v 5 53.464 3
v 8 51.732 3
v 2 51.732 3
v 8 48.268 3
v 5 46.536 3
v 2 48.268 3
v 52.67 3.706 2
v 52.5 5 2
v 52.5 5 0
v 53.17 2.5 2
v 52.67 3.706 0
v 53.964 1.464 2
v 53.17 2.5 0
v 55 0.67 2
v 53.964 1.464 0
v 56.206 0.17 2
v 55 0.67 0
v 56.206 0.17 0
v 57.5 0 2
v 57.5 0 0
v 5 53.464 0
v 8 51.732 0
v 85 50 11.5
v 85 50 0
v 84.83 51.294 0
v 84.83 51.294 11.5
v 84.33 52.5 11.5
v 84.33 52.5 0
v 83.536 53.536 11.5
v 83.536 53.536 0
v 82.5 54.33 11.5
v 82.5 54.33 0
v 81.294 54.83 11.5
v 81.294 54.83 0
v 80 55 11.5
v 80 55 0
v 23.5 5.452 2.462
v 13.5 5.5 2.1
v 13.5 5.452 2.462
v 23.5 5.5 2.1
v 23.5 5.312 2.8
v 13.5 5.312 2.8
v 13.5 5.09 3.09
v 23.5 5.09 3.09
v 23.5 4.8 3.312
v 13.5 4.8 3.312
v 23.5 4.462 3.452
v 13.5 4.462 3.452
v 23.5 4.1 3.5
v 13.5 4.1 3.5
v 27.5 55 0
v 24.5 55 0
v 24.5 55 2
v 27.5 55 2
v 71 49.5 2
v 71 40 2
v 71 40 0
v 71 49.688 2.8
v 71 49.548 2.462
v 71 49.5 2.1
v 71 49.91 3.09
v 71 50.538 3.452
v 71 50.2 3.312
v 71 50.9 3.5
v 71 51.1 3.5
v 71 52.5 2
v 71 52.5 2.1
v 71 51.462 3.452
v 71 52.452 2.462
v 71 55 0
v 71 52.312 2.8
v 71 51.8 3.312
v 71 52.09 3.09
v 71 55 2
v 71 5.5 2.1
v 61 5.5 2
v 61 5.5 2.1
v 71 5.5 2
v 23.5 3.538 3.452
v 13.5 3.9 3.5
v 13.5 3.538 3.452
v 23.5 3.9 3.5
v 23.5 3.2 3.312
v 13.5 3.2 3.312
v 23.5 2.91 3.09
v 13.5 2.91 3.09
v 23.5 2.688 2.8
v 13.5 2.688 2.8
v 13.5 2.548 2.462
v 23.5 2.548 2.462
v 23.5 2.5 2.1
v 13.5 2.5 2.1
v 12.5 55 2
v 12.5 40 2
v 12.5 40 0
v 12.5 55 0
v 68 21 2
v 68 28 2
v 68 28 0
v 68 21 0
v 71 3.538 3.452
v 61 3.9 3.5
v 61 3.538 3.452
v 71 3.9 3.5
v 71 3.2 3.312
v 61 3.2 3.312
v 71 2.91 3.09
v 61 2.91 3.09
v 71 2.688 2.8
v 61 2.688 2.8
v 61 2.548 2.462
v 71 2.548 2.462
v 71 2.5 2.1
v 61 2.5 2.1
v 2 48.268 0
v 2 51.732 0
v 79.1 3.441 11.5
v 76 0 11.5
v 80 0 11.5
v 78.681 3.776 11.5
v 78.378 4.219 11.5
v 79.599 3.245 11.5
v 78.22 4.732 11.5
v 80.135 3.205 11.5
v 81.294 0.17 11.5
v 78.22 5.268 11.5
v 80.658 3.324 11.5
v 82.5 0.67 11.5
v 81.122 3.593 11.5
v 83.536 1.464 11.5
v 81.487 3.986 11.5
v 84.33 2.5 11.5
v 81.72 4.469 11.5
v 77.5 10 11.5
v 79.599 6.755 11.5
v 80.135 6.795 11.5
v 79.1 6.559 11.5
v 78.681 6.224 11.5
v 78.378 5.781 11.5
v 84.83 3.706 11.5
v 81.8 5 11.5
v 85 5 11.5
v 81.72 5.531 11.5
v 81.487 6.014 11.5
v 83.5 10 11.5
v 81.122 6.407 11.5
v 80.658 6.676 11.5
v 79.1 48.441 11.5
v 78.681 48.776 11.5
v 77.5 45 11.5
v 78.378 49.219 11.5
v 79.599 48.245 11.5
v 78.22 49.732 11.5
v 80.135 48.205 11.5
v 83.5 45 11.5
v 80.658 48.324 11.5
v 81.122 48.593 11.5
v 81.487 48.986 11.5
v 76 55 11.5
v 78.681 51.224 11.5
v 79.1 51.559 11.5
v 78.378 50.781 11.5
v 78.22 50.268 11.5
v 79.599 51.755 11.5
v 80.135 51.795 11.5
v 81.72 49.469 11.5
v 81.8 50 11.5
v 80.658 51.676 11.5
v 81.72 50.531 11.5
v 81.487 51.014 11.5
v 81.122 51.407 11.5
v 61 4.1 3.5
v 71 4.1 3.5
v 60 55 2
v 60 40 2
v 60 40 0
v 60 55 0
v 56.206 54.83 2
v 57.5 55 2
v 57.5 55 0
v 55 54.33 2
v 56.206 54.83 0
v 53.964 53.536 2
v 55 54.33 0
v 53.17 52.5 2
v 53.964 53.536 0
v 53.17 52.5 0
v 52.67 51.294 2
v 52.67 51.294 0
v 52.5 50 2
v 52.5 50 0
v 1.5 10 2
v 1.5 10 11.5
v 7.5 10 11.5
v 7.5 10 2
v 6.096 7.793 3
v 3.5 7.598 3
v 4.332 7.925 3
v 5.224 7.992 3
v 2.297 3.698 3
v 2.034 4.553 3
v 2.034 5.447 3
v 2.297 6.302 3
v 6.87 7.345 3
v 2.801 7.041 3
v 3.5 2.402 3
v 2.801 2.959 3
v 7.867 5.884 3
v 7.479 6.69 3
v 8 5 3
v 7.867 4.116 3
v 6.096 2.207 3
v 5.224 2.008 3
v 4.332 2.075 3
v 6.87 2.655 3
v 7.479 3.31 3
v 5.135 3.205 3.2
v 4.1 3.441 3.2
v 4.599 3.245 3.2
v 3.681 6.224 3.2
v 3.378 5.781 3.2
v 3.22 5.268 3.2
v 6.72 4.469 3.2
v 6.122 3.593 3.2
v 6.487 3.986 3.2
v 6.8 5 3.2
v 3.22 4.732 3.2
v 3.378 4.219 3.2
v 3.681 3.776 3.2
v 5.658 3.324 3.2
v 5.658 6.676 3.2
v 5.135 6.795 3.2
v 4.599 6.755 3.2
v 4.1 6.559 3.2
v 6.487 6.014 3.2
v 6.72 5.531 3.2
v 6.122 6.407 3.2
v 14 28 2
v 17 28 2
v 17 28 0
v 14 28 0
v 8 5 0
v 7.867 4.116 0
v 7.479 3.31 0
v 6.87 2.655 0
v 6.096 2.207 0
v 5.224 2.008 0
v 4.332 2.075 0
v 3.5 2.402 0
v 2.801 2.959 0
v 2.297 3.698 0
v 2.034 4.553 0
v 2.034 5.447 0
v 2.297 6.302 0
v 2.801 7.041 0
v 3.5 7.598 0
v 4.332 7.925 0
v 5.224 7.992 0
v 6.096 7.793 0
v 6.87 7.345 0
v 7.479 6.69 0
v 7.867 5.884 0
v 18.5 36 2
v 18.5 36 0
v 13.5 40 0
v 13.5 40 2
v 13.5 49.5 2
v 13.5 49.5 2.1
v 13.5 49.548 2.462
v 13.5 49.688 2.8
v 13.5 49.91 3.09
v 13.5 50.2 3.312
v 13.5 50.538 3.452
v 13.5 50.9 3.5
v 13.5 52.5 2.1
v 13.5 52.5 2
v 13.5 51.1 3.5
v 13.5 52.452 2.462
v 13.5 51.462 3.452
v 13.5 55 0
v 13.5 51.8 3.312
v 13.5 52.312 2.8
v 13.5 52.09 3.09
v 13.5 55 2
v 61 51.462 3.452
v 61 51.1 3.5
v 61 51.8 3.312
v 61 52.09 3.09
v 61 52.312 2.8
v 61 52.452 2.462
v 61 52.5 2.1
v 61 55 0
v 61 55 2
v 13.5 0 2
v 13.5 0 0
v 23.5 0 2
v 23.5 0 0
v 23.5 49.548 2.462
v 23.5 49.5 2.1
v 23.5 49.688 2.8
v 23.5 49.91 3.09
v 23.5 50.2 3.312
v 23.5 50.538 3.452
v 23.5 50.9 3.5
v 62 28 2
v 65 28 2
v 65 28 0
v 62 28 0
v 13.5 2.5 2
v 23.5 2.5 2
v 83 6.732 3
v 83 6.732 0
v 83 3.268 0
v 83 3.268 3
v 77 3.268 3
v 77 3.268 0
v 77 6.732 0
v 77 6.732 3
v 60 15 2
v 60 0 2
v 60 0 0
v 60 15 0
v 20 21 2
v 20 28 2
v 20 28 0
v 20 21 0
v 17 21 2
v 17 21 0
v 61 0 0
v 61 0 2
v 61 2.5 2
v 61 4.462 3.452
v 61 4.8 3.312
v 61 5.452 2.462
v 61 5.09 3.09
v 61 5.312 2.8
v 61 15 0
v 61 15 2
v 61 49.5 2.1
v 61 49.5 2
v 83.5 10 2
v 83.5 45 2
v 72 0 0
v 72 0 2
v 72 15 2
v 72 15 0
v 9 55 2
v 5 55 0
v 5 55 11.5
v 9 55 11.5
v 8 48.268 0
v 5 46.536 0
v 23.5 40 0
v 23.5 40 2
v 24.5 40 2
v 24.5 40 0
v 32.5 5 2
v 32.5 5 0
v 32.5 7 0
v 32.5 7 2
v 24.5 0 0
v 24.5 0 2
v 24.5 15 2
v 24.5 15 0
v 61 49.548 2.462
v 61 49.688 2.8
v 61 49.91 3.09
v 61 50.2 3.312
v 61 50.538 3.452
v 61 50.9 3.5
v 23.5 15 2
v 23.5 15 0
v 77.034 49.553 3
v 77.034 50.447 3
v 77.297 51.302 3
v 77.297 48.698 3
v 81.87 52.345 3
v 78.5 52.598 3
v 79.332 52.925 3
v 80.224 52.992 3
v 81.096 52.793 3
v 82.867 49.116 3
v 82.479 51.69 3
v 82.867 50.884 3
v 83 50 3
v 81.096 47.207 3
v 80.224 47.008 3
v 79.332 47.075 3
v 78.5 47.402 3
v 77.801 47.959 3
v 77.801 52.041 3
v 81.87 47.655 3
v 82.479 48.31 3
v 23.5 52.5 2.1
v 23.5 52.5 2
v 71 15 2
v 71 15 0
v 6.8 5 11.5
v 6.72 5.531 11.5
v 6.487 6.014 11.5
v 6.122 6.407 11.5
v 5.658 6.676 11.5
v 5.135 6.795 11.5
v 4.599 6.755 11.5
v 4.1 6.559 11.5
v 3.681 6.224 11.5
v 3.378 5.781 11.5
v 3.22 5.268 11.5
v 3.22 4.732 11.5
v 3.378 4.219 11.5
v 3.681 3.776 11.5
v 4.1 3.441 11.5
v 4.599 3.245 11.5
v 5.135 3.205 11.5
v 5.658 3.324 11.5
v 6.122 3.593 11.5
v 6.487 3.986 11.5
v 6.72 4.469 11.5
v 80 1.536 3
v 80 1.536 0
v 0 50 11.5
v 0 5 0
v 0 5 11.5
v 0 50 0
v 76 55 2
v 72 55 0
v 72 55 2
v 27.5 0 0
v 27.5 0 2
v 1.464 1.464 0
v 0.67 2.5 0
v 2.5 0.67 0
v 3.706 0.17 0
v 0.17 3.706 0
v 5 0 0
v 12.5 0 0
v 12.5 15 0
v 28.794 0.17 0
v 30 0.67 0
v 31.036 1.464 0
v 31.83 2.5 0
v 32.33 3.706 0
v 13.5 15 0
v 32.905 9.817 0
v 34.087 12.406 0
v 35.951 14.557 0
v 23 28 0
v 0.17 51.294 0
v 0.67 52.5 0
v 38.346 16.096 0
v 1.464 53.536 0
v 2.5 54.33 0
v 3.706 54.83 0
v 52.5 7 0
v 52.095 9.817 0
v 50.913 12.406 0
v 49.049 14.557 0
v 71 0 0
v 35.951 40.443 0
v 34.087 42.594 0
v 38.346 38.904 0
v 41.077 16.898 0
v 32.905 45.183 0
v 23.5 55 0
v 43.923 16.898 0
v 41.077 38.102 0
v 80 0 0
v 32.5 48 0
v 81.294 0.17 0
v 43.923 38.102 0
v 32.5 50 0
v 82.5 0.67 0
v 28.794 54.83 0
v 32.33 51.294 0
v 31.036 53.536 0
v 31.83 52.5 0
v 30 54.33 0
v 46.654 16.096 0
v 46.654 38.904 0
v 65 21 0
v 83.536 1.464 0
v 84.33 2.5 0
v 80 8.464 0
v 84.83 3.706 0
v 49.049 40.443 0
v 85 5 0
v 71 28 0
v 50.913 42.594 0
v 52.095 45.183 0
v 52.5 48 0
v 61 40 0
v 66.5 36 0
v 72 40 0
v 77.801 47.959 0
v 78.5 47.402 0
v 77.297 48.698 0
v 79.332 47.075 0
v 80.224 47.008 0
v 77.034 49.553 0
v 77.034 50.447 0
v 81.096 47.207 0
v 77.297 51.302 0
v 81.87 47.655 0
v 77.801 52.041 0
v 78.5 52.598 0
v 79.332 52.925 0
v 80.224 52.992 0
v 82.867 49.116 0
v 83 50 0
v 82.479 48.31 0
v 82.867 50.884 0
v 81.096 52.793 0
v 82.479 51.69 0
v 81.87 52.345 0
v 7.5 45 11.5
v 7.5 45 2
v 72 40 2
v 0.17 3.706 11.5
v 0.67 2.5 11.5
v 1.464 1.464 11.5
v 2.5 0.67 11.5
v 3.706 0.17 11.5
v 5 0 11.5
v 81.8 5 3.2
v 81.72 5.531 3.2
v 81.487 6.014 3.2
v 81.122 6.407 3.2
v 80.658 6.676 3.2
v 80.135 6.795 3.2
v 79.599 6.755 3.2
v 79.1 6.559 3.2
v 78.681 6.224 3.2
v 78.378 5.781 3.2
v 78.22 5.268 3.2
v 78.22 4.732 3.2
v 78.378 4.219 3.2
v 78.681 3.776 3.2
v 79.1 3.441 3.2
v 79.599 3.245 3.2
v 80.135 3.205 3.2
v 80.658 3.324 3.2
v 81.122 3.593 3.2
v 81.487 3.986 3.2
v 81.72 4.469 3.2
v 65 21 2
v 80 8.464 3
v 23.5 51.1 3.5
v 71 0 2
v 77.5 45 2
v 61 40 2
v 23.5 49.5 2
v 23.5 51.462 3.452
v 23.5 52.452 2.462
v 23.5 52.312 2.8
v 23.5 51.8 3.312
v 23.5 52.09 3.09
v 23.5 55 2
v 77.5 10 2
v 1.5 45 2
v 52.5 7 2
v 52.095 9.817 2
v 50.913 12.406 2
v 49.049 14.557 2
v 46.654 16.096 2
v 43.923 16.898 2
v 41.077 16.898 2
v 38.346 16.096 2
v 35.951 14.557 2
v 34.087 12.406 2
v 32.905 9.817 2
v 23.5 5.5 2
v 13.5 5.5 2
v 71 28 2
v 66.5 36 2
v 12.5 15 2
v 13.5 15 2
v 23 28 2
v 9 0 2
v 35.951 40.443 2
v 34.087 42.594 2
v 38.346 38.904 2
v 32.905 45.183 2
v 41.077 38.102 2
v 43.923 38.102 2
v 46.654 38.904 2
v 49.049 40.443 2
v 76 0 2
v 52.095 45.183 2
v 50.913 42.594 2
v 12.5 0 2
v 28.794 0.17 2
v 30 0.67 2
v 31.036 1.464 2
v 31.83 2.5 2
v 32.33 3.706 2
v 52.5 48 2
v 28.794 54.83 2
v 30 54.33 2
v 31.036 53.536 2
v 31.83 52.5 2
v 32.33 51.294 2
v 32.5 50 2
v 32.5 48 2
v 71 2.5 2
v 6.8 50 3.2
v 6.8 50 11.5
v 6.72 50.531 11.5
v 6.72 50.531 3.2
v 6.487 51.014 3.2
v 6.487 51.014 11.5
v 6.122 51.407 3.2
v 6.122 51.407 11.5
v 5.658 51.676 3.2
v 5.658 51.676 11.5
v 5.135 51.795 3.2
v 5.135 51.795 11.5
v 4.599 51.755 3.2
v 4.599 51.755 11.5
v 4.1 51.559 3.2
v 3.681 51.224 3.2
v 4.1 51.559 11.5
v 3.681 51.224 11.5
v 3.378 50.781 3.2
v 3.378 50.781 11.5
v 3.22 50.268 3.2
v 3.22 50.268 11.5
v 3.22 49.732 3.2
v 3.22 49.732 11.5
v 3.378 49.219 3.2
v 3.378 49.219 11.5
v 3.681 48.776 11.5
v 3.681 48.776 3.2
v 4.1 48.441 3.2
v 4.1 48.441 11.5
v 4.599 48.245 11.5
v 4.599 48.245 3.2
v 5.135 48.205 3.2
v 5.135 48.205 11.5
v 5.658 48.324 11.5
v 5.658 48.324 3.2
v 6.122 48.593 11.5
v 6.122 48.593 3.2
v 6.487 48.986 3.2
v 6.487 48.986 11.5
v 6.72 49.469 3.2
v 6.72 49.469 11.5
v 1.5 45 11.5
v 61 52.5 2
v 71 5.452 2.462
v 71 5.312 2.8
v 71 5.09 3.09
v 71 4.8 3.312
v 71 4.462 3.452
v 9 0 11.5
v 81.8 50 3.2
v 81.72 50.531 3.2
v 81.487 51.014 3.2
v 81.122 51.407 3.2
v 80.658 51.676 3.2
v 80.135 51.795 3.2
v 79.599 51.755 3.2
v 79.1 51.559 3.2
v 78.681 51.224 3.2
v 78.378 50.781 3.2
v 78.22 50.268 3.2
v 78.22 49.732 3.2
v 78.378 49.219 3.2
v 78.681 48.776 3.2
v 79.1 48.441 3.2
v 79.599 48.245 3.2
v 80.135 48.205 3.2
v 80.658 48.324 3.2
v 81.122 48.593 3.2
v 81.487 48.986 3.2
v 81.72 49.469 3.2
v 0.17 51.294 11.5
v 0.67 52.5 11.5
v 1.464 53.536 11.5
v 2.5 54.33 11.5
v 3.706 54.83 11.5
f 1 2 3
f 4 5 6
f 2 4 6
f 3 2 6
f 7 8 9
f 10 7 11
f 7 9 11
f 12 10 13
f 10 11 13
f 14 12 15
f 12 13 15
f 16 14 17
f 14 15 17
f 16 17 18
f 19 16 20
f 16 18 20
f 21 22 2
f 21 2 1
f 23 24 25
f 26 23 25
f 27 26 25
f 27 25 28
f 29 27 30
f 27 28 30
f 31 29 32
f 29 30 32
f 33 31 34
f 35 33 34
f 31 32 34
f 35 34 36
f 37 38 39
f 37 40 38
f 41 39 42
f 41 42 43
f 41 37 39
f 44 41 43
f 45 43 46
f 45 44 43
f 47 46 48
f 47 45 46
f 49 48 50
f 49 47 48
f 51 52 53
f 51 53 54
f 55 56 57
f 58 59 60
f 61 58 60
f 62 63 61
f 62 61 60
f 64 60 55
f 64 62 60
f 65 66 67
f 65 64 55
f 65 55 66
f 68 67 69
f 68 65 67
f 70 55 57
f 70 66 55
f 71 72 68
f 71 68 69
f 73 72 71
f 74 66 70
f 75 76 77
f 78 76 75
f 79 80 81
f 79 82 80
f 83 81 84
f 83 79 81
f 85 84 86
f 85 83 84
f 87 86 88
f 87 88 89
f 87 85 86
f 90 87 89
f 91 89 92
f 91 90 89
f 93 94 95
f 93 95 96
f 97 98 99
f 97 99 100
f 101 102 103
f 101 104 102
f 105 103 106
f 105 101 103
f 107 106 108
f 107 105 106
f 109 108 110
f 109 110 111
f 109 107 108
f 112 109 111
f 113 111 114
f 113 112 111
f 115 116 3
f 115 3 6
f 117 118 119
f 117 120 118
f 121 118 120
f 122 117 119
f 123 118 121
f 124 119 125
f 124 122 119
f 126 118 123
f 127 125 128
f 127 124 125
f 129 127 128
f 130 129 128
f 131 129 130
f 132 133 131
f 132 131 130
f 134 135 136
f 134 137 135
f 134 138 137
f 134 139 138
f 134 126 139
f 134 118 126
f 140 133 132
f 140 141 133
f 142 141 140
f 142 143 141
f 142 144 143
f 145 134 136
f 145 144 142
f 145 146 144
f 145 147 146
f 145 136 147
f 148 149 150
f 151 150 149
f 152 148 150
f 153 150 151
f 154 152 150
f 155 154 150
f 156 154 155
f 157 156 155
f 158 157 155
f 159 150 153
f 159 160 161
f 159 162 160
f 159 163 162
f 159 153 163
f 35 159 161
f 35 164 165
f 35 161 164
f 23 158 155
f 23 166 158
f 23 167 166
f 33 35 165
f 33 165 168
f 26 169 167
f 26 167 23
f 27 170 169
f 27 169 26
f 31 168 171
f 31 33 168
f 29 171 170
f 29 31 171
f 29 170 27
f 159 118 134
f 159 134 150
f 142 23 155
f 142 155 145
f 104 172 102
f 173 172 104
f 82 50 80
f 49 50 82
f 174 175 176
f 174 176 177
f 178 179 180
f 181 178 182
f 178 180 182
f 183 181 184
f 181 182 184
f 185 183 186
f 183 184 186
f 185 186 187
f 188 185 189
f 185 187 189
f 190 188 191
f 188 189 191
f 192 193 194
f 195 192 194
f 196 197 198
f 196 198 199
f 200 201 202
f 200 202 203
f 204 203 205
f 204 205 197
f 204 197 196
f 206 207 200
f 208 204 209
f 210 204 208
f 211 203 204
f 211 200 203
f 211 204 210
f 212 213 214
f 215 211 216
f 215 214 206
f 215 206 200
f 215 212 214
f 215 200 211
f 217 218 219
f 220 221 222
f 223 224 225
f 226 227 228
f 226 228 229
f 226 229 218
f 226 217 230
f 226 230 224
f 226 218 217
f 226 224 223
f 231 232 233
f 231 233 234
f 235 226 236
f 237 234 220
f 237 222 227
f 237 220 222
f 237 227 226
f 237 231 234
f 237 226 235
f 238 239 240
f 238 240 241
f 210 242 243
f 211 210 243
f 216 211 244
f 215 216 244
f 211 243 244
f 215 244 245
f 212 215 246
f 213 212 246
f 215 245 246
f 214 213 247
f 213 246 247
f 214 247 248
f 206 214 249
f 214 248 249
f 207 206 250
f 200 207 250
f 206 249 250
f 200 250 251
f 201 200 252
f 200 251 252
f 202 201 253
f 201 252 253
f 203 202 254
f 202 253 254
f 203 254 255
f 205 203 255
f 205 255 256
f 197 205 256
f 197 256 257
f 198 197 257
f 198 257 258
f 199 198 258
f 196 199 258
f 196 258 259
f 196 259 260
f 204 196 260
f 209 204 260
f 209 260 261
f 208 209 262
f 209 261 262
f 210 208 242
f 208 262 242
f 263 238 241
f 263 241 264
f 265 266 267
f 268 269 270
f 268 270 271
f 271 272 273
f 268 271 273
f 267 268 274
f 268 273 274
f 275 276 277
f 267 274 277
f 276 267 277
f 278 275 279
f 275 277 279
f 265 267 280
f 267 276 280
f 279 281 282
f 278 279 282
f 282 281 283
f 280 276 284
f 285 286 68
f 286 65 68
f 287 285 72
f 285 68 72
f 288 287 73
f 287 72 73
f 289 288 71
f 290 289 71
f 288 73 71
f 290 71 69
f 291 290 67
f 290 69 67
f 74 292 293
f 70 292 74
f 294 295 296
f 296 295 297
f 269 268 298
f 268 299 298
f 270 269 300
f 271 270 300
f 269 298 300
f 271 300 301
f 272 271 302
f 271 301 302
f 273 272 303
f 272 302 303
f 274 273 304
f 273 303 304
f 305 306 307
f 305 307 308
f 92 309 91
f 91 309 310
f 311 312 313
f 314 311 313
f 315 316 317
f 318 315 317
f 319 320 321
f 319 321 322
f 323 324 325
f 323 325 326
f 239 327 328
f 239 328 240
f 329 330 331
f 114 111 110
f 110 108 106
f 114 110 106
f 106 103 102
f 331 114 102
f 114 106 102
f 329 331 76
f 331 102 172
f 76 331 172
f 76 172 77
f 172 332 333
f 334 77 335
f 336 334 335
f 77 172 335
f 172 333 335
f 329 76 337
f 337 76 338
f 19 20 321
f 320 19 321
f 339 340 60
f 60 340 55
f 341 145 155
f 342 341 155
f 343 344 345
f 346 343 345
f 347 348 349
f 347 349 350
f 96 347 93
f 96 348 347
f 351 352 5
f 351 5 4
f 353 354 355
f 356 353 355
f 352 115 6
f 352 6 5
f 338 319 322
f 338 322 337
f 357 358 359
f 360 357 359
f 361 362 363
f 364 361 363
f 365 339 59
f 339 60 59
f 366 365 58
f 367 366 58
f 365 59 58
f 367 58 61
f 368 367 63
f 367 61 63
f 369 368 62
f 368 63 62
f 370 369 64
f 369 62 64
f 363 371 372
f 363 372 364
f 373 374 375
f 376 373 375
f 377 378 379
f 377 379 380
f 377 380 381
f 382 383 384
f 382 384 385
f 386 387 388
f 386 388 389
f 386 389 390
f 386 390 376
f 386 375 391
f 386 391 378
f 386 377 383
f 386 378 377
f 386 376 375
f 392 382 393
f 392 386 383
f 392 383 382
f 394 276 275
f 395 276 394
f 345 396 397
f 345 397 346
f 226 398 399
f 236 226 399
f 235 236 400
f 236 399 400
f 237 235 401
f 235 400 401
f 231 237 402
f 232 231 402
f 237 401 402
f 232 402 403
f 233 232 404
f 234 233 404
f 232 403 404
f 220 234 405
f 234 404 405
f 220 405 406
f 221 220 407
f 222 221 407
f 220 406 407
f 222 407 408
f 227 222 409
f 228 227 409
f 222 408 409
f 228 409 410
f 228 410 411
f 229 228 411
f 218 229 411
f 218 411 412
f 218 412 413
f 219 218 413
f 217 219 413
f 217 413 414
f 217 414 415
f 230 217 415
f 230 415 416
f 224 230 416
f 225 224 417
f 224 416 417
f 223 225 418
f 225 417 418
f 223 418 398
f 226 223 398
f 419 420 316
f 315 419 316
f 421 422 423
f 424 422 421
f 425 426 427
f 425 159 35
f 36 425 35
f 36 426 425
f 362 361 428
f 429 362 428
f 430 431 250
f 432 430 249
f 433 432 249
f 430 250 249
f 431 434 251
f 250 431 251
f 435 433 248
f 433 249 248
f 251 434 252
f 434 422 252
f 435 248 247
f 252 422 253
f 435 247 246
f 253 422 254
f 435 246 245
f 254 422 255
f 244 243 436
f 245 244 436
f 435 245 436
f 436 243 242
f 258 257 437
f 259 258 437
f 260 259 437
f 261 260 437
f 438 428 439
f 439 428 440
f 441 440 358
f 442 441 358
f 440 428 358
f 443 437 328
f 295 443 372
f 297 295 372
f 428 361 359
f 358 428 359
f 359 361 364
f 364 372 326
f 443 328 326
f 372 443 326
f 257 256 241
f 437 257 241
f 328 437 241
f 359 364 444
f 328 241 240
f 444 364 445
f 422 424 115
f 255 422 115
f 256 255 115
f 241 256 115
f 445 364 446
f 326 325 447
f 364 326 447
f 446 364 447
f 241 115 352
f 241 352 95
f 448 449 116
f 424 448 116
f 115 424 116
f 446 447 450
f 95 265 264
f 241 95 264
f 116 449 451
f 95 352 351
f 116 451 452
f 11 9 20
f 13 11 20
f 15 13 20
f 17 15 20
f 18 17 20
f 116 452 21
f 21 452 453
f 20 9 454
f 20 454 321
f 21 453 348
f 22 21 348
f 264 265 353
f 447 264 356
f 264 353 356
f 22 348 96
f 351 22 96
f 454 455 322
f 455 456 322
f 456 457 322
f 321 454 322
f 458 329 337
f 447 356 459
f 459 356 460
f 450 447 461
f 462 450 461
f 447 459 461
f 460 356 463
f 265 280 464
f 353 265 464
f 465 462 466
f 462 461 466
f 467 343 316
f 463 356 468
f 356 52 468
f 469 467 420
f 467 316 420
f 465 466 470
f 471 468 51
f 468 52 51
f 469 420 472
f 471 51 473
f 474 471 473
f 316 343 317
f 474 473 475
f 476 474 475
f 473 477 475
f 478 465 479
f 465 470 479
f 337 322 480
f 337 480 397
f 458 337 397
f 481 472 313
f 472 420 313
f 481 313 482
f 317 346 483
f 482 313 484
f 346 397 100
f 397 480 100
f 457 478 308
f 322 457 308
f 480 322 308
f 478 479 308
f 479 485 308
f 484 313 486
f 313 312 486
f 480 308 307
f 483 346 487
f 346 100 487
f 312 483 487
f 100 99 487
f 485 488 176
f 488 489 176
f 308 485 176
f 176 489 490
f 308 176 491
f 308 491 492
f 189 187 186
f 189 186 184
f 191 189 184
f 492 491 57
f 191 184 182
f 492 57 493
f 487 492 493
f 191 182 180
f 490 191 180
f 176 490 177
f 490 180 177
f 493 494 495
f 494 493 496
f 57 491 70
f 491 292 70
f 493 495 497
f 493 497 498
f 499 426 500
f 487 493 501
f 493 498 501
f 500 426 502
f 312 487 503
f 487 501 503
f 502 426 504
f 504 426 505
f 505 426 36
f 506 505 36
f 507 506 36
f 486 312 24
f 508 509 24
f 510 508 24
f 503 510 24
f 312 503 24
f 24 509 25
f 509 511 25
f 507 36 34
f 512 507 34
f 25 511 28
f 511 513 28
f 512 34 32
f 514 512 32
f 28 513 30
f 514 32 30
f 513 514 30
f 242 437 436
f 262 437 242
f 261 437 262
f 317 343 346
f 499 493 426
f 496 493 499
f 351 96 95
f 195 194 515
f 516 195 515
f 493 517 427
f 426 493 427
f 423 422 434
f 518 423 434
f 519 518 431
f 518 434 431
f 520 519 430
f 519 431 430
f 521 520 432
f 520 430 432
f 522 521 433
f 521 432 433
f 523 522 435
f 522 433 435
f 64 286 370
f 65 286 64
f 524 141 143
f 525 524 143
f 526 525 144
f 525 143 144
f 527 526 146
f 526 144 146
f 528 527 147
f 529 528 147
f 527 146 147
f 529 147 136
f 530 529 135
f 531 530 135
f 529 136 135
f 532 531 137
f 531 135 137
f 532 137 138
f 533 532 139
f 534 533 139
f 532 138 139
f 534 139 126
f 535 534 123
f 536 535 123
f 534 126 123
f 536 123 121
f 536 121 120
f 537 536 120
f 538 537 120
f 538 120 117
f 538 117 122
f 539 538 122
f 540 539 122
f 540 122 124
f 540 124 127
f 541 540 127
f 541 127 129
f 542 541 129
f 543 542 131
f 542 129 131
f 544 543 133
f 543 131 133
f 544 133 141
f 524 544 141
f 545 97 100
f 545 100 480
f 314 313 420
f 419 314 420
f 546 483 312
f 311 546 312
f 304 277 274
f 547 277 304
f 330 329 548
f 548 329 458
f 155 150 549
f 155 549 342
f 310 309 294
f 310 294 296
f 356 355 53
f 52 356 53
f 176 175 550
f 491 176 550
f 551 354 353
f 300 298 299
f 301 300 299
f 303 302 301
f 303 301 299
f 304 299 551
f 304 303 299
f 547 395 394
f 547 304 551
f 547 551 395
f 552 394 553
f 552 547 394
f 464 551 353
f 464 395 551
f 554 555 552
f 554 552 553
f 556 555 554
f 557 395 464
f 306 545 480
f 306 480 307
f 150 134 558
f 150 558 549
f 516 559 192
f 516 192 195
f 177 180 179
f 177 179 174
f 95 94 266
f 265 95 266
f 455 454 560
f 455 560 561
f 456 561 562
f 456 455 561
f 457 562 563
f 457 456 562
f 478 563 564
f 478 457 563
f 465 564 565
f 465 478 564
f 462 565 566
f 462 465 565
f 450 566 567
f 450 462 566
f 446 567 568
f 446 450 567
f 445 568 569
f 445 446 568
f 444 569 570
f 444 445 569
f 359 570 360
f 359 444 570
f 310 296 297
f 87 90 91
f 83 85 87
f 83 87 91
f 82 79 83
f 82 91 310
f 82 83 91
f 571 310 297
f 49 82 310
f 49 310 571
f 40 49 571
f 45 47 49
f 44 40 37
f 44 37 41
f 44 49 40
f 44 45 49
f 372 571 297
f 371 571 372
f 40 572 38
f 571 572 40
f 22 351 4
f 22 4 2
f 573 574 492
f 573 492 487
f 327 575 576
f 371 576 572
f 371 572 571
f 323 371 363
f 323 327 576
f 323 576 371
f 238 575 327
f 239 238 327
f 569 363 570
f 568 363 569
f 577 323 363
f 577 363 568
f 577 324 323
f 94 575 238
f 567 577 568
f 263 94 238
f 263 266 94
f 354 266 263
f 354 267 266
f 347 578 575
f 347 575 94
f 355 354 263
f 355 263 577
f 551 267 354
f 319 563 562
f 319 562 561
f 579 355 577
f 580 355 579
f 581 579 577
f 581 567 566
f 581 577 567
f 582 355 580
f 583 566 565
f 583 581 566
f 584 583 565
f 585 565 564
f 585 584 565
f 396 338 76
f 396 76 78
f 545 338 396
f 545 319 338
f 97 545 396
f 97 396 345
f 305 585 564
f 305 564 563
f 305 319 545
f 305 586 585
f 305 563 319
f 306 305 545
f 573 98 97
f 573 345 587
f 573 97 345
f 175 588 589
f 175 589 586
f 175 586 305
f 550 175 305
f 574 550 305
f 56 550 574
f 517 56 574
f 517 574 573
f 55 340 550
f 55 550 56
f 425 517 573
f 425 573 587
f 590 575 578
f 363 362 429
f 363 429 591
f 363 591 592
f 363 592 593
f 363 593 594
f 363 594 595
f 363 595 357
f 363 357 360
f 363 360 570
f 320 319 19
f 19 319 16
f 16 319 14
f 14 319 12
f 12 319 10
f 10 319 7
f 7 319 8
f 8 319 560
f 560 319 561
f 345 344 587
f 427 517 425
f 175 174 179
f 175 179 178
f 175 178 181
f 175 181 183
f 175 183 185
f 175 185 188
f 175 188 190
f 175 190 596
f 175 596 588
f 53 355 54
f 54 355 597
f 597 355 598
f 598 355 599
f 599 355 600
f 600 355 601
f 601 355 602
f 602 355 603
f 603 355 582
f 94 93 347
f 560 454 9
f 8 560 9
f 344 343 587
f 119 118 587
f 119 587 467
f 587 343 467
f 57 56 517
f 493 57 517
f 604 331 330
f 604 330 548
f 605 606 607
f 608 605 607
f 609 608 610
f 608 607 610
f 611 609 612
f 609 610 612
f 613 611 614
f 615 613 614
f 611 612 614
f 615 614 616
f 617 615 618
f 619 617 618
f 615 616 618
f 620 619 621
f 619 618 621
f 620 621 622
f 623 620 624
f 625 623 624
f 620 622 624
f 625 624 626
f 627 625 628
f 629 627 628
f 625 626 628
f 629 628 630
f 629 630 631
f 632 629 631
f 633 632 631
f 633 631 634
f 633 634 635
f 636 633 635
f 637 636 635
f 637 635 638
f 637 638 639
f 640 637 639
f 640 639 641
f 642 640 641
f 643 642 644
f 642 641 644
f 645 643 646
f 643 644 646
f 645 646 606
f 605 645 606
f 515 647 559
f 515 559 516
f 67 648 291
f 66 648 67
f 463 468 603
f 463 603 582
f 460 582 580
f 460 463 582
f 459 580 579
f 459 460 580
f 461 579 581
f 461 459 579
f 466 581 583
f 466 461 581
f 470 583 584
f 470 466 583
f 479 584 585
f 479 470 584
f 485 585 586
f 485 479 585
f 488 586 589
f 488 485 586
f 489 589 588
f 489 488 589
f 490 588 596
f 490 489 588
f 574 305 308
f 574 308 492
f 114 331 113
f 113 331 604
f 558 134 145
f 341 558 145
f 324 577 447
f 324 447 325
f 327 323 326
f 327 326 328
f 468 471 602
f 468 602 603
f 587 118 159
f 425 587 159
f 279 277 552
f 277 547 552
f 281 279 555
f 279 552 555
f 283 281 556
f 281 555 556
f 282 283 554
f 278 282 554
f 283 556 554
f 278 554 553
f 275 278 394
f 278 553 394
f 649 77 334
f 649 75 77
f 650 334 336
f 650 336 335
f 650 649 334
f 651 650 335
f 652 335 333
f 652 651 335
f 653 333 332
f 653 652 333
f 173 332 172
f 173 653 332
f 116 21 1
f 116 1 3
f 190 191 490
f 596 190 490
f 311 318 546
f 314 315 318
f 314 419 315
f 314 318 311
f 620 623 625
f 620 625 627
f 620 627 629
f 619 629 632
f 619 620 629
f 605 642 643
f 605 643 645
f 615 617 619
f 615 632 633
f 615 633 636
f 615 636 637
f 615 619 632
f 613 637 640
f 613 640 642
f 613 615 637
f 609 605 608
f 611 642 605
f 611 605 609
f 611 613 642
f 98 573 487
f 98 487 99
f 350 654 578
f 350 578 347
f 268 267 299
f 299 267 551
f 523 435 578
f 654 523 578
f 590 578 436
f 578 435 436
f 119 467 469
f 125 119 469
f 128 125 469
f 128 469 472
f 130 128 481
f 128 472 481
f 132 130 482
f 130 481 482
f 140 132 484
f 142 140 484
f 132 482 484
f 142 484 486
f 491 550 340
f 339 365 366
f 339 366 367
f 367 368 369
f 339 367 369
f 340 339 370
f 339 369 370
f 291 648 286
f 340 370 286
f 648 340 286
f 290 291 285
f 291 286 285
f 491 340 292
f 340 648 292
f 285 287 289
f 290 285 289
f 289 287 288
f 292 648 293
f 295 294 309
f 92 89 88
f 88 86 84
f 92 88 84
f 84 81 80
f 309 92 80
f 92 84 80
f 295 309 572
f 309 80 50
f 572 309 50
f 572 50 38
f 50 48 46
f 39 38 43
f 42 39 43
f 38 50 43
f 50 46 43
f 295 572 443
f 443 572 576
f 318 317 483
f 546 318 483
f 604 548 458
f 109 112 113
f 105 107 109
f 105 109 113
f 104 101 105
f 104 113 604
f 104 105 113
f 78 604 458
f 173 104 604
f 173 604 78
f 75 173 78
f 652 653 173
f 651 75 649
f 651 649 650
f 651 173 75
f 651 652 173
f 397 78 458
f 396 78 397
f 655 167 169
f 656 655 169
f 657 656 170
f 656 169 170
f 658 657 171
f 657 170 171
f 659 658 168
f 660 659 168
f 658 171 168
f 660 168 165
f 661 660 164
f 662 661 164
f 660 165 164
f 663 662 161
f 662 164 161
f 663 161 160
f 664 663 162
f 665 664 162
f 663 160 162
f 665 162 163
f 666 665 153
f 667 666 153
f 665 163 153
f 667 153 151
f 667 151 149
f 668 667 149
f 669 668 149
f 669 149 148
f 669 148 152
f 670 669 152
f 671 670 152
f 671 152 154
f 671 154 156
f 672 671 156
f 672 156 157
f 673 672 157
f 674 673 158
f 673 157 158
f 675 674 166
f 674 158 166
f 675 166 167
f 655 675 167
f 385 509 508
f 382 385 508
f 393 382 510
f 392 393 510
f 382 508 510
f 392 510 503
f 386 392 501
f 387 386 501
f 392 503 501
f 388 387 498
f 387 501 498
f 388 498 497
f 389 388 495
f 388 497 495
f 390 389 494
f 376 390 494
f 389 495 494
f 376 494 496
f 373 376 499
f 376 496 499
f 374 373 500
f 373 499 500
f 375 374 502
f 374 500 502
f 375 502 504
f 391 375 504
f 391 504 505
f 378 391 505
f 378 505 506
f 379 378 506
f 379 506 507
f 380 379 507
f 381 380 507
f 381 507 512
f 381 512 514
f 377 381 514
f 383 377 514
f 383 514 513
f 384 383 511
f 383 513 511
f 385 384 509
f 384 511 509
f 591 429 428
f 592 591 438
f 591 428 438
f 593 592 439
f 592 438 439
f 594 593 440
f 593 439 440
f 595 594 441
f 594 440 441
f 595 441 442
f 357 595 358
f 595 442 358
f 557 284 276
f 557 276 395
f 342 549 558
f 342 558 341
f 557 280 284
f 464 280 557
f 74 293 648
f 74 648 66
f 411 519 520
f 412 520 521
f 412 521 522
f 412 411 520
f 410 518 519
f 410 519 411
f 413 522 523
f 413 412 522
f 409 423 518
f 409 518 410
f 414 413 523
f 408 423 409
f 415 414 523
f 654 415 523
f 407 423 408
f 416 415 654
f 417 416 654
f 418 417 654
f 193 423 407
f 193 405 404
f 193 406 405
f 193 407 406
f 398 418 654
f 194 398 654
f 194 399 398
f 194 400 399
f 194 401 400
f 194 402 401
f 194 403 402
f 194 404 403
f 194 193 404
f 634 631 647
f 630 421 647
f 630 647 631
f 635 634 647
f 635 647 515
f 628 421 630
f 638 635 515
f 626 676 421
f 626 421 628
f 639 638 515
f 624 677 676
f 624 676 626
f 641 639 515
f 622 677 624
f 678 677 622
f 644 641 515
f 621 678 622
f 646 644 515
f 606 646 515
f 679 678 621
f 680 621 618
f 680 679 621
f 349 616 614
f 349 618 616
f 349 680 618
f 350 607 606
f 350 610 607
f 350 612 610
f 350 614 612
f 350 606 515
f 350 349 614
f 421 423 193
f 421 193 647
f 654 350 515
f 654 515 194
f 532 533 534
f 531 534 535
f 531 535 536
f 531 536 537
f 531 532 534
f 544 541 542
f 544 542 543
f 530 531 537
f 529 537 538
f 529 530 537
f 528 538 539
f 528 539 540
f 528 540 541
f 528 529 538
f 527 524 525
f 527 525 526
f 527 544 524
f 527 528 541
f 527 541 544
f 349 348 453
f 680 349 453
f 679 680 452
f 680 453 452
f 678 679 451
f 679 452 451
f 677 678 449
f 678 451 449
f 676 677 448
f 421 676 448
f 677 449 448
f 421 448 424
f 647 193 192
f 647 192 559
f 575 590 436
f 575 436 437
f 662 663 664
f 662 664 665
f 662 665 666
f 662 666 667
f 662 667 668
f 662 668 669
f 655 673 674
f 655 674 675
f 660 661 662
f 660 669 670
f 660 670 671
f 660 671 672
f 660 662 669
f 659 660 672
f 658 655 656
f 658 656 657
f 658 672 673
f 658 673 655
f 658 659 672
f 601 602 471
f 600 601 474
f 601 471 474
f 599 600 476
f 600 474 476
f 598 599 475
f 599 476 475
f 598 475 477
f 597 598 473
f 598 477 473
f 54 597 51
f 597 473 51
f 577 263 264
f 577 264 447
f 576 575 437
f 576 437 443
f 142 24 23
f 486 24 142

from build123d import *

# Parameters (mm, degrees)
PAD_DEPTH       = 11.5
SKETCH001_W     = 67
SKETCH001_H     = 65
POCKET_DEPTH    = 9.5
SKETCH002_R     = 3
POCKET001_DEPTH = 3
SKETCH003_W     = 6
SKETCH003_H     = 35
POCKET002_DEPTH = 9.5
SKETCH004_R     = 1.8
POCKET003_DEPTH = 8.3
SKETCH006_W     = 1
SKETCH006_H     = 15
POCKET004_DEPTH = 5
SKETCH007_W     = 1
SKETCH007_H     = 15
POCKET005_DEPTH = 5
SKETCH008_W     = 10
SKETCH008_H     = 3
PAD001_DEPTH    = 1.5
FILLET_R        = 1.4
POCKET006_DEPTH = 5


with BuildPart() as part:
    # Sketch → Pad (new body)
    with BuildSketch(Plane.XY):
        with BuildLine():
            ThreePointArc((0, 5), (1.464466, 1.464466), (5, 0))
            Line((5, 0), (27.5, 0))
            ThreePointArc((27.5, 0), (31.035534, 1.464466), (32.5, 5))
            Line((32.5, 5), (32.5, 7))
            ThreePointArc((52.5, 7), (42.5, 17), (32.5, 7))
            Line((52.5, 7), (52.5, 5))
            ThreePointArc((52.5, 5), (53.964466, 1.464466), (57.5, 0))
            Line((57.5, 0), (80, 0))
            ThreePointArc((80, 0), (83.535534, 1.464466), (85, 5))
            Line((85, 50), (85, 5))
            ThreePointArc((85, 50), (83.535534, 53.535534), (80, 55))
            Line((57.5, 55), (80, 55))
            ThreePointArc((57.5, 55), (53.964466, 53.535534), (52.5, 50))
            Line((52.5, 50), (52.5, 48))
            ThreePointArc((32.5, 48), (42.5, 38), (52.5, 48))
            Line((32.5, 50), (32.5, 48))
            ThreePointArc((32.5, 50), (31.035534, 53.535534), (27.5, 55))
            Line((5, 55), (27.5, 55))
            ThreePointArc((5, 55), (1.464466, 53.535534), (0, 50))
            Line((0, 5), (0, 50))
        make_face()
    extrude(amount=PAD_DEPTH)

    # Sketch001 → Pocket (cut)
    with BuildSketch(Plane.XY.offset(11.5)):
        with Locations((42.5, 27.5)):
            Rectangle(SKETCH001_W, SKETCH001_H)
    extrude(amount=-POCKET_DEPTH, mode=Mode.SUBTRACT)

    # Sketch002 → Pocket001 (cut)
    with BuildSketch(Plane(origin=(0, 0, 0), x_dir=(1, 0, 0), z_dir=(0, 0, -1))):
        with Locations((80, -50)):
            Circle(SKETCH002_R)
        with Locations((5, -5)):
            Circle(SKETCH002_R)
        Polygon((2, -51.732051), (2, -48.267949), (5, -46.535898), (8, -48.267949), (8, -51.732051), (5, -53.464102), align=None)
        Polygon((77, -3.267949), (77, -6.732051), (80, -8.464102), (83, -6.732051), (83, -3.267949), (80, -1.535898), align=None)
    extrude(amount=-POCKET001_DEPTH, mode=Mode.SUBTRACT)

    # Sketch003 → Pocket002 (cut)
    with BuildSketch(Plane.XY.offset(11.5)):
        with Locations((4.5, 27.5)):
            Rectangle(SKETCH003_W, SKETCH003_H)
        with Locations((80.5, 27.5)):
            Rectangle(SKETCH003_W, SKETCH003_H)
    extrude(amount=-POCKET002_DEPTH, mode=Mode.SUBTRACT)

    # Sketch004 → Pocket003 (cut)
    with BuildSketch(Plane.XY.offset(11.5)):
        with Locations((5, 50)):
            Circle(SKETCH004_R)
        with Locations((80, 50)):
            Circle(SKETCH004_R)
        with Locations((80, 5)):
            Circle(SKETCH004_R)
        with Locations((5, 5)):
            Circle(SKETCH004_R)
    extrude(amount=-POCKET003_DEPTH, mode=Mode.SUBTRACT)

    # Sketch006 → Pocket004 (cut)
    with BuildSketch(Plane.XY.offset(2)):
        with Locations((71.5, 47.5)):
            Rectangle(SKETCH006_W, SKETCH006_H)
        with Locations((60.5, 47.5)):
            Rectangle(SKETCH006_W, SKETCH006_H)
        with Locations((24, 47.5)):
            Rectangle(SKETCH006_W, SKETCH006_H)
        with Locations((13, 47.5)):
            Rectangle(SKETCH006_W, SKETCH006_H)
    extrude(amount=-POCKET004_DEPTH, mode=Mode.SUBTRACT)

    # Sketch007 → Pocket005 (cut)
    with BuildSketch(Plane.XY.offset(2)):
        with Locations((71.5, 7.5)):
            Rectangle(SKETCH007_W, SKETCH007_H)
        with Locations((60.5, 7.5)):
            Rectangle(SKETCH007_W, SKETCH007_H)
        with Locations((24, 7.5)):
            Rectangle(SKETCH007_W, SKETCH007_H)
        with Locations((13, 7.5)):
            Rectangle(SKETCH007_W, SKETCH007_H)
    extrude(amount=-POCKET005_DEPTH, mode=Mode.SUBTRACT)

    # Sketch008 → Pad001 (new body)
    with BuildSketch(Plane.XY.offset(2)):
        with Locations((18.5, 4)):
            Rectangle(SKETCH008_W, SKETCH008_H)
        with Locations((66, 4)):
            Rectangle(SKETCH008_W, SKETCH008_H)
        with Locations((18.5, 51)):
            Rectangle(SKETCH008_W, SKETCH008_H)
        with Locations((66, 51)):
            Rectangle(SKETCH008_W, SKETCH008_H)
    extrude(amount=PAD001_DEPTH)

    # Fillet
    fillet_edges = [part.edges().sort_by_distance(p)[0] for p in [
        (18.5, 49.5, 3.5),
        (18.5, 52.5, 3.5),
        (66, 52.5, 3.5),
        (66, 49.5, 3.5),
        (66, 5.5, 3.5),
        (66, 2.5, 3.5),
        (18.5, 2.5, 3.5),
        (18.5, 5.5, 3.5),
    ]]
    fillet(fillet_edges, radius=FILLET_R)

    # Sketch005 → Pocket006 (cut)
    with BuildSketch(Plane.XY.offset(2)):
        Polygon((17, 28), (14, 28), (18.5, 36), (23, 28), (20, 28), (20, 21), (17, 21), align=None)
        Polygon((65, 28), (62, 28), (66.5, 36), (71, 28), (68, 28), (68, 21), (65, 21), align=None)
    extrude(amount=-POCKET006_DEPTH, mode=Mode.SUBTRACT)


solid = part.part
